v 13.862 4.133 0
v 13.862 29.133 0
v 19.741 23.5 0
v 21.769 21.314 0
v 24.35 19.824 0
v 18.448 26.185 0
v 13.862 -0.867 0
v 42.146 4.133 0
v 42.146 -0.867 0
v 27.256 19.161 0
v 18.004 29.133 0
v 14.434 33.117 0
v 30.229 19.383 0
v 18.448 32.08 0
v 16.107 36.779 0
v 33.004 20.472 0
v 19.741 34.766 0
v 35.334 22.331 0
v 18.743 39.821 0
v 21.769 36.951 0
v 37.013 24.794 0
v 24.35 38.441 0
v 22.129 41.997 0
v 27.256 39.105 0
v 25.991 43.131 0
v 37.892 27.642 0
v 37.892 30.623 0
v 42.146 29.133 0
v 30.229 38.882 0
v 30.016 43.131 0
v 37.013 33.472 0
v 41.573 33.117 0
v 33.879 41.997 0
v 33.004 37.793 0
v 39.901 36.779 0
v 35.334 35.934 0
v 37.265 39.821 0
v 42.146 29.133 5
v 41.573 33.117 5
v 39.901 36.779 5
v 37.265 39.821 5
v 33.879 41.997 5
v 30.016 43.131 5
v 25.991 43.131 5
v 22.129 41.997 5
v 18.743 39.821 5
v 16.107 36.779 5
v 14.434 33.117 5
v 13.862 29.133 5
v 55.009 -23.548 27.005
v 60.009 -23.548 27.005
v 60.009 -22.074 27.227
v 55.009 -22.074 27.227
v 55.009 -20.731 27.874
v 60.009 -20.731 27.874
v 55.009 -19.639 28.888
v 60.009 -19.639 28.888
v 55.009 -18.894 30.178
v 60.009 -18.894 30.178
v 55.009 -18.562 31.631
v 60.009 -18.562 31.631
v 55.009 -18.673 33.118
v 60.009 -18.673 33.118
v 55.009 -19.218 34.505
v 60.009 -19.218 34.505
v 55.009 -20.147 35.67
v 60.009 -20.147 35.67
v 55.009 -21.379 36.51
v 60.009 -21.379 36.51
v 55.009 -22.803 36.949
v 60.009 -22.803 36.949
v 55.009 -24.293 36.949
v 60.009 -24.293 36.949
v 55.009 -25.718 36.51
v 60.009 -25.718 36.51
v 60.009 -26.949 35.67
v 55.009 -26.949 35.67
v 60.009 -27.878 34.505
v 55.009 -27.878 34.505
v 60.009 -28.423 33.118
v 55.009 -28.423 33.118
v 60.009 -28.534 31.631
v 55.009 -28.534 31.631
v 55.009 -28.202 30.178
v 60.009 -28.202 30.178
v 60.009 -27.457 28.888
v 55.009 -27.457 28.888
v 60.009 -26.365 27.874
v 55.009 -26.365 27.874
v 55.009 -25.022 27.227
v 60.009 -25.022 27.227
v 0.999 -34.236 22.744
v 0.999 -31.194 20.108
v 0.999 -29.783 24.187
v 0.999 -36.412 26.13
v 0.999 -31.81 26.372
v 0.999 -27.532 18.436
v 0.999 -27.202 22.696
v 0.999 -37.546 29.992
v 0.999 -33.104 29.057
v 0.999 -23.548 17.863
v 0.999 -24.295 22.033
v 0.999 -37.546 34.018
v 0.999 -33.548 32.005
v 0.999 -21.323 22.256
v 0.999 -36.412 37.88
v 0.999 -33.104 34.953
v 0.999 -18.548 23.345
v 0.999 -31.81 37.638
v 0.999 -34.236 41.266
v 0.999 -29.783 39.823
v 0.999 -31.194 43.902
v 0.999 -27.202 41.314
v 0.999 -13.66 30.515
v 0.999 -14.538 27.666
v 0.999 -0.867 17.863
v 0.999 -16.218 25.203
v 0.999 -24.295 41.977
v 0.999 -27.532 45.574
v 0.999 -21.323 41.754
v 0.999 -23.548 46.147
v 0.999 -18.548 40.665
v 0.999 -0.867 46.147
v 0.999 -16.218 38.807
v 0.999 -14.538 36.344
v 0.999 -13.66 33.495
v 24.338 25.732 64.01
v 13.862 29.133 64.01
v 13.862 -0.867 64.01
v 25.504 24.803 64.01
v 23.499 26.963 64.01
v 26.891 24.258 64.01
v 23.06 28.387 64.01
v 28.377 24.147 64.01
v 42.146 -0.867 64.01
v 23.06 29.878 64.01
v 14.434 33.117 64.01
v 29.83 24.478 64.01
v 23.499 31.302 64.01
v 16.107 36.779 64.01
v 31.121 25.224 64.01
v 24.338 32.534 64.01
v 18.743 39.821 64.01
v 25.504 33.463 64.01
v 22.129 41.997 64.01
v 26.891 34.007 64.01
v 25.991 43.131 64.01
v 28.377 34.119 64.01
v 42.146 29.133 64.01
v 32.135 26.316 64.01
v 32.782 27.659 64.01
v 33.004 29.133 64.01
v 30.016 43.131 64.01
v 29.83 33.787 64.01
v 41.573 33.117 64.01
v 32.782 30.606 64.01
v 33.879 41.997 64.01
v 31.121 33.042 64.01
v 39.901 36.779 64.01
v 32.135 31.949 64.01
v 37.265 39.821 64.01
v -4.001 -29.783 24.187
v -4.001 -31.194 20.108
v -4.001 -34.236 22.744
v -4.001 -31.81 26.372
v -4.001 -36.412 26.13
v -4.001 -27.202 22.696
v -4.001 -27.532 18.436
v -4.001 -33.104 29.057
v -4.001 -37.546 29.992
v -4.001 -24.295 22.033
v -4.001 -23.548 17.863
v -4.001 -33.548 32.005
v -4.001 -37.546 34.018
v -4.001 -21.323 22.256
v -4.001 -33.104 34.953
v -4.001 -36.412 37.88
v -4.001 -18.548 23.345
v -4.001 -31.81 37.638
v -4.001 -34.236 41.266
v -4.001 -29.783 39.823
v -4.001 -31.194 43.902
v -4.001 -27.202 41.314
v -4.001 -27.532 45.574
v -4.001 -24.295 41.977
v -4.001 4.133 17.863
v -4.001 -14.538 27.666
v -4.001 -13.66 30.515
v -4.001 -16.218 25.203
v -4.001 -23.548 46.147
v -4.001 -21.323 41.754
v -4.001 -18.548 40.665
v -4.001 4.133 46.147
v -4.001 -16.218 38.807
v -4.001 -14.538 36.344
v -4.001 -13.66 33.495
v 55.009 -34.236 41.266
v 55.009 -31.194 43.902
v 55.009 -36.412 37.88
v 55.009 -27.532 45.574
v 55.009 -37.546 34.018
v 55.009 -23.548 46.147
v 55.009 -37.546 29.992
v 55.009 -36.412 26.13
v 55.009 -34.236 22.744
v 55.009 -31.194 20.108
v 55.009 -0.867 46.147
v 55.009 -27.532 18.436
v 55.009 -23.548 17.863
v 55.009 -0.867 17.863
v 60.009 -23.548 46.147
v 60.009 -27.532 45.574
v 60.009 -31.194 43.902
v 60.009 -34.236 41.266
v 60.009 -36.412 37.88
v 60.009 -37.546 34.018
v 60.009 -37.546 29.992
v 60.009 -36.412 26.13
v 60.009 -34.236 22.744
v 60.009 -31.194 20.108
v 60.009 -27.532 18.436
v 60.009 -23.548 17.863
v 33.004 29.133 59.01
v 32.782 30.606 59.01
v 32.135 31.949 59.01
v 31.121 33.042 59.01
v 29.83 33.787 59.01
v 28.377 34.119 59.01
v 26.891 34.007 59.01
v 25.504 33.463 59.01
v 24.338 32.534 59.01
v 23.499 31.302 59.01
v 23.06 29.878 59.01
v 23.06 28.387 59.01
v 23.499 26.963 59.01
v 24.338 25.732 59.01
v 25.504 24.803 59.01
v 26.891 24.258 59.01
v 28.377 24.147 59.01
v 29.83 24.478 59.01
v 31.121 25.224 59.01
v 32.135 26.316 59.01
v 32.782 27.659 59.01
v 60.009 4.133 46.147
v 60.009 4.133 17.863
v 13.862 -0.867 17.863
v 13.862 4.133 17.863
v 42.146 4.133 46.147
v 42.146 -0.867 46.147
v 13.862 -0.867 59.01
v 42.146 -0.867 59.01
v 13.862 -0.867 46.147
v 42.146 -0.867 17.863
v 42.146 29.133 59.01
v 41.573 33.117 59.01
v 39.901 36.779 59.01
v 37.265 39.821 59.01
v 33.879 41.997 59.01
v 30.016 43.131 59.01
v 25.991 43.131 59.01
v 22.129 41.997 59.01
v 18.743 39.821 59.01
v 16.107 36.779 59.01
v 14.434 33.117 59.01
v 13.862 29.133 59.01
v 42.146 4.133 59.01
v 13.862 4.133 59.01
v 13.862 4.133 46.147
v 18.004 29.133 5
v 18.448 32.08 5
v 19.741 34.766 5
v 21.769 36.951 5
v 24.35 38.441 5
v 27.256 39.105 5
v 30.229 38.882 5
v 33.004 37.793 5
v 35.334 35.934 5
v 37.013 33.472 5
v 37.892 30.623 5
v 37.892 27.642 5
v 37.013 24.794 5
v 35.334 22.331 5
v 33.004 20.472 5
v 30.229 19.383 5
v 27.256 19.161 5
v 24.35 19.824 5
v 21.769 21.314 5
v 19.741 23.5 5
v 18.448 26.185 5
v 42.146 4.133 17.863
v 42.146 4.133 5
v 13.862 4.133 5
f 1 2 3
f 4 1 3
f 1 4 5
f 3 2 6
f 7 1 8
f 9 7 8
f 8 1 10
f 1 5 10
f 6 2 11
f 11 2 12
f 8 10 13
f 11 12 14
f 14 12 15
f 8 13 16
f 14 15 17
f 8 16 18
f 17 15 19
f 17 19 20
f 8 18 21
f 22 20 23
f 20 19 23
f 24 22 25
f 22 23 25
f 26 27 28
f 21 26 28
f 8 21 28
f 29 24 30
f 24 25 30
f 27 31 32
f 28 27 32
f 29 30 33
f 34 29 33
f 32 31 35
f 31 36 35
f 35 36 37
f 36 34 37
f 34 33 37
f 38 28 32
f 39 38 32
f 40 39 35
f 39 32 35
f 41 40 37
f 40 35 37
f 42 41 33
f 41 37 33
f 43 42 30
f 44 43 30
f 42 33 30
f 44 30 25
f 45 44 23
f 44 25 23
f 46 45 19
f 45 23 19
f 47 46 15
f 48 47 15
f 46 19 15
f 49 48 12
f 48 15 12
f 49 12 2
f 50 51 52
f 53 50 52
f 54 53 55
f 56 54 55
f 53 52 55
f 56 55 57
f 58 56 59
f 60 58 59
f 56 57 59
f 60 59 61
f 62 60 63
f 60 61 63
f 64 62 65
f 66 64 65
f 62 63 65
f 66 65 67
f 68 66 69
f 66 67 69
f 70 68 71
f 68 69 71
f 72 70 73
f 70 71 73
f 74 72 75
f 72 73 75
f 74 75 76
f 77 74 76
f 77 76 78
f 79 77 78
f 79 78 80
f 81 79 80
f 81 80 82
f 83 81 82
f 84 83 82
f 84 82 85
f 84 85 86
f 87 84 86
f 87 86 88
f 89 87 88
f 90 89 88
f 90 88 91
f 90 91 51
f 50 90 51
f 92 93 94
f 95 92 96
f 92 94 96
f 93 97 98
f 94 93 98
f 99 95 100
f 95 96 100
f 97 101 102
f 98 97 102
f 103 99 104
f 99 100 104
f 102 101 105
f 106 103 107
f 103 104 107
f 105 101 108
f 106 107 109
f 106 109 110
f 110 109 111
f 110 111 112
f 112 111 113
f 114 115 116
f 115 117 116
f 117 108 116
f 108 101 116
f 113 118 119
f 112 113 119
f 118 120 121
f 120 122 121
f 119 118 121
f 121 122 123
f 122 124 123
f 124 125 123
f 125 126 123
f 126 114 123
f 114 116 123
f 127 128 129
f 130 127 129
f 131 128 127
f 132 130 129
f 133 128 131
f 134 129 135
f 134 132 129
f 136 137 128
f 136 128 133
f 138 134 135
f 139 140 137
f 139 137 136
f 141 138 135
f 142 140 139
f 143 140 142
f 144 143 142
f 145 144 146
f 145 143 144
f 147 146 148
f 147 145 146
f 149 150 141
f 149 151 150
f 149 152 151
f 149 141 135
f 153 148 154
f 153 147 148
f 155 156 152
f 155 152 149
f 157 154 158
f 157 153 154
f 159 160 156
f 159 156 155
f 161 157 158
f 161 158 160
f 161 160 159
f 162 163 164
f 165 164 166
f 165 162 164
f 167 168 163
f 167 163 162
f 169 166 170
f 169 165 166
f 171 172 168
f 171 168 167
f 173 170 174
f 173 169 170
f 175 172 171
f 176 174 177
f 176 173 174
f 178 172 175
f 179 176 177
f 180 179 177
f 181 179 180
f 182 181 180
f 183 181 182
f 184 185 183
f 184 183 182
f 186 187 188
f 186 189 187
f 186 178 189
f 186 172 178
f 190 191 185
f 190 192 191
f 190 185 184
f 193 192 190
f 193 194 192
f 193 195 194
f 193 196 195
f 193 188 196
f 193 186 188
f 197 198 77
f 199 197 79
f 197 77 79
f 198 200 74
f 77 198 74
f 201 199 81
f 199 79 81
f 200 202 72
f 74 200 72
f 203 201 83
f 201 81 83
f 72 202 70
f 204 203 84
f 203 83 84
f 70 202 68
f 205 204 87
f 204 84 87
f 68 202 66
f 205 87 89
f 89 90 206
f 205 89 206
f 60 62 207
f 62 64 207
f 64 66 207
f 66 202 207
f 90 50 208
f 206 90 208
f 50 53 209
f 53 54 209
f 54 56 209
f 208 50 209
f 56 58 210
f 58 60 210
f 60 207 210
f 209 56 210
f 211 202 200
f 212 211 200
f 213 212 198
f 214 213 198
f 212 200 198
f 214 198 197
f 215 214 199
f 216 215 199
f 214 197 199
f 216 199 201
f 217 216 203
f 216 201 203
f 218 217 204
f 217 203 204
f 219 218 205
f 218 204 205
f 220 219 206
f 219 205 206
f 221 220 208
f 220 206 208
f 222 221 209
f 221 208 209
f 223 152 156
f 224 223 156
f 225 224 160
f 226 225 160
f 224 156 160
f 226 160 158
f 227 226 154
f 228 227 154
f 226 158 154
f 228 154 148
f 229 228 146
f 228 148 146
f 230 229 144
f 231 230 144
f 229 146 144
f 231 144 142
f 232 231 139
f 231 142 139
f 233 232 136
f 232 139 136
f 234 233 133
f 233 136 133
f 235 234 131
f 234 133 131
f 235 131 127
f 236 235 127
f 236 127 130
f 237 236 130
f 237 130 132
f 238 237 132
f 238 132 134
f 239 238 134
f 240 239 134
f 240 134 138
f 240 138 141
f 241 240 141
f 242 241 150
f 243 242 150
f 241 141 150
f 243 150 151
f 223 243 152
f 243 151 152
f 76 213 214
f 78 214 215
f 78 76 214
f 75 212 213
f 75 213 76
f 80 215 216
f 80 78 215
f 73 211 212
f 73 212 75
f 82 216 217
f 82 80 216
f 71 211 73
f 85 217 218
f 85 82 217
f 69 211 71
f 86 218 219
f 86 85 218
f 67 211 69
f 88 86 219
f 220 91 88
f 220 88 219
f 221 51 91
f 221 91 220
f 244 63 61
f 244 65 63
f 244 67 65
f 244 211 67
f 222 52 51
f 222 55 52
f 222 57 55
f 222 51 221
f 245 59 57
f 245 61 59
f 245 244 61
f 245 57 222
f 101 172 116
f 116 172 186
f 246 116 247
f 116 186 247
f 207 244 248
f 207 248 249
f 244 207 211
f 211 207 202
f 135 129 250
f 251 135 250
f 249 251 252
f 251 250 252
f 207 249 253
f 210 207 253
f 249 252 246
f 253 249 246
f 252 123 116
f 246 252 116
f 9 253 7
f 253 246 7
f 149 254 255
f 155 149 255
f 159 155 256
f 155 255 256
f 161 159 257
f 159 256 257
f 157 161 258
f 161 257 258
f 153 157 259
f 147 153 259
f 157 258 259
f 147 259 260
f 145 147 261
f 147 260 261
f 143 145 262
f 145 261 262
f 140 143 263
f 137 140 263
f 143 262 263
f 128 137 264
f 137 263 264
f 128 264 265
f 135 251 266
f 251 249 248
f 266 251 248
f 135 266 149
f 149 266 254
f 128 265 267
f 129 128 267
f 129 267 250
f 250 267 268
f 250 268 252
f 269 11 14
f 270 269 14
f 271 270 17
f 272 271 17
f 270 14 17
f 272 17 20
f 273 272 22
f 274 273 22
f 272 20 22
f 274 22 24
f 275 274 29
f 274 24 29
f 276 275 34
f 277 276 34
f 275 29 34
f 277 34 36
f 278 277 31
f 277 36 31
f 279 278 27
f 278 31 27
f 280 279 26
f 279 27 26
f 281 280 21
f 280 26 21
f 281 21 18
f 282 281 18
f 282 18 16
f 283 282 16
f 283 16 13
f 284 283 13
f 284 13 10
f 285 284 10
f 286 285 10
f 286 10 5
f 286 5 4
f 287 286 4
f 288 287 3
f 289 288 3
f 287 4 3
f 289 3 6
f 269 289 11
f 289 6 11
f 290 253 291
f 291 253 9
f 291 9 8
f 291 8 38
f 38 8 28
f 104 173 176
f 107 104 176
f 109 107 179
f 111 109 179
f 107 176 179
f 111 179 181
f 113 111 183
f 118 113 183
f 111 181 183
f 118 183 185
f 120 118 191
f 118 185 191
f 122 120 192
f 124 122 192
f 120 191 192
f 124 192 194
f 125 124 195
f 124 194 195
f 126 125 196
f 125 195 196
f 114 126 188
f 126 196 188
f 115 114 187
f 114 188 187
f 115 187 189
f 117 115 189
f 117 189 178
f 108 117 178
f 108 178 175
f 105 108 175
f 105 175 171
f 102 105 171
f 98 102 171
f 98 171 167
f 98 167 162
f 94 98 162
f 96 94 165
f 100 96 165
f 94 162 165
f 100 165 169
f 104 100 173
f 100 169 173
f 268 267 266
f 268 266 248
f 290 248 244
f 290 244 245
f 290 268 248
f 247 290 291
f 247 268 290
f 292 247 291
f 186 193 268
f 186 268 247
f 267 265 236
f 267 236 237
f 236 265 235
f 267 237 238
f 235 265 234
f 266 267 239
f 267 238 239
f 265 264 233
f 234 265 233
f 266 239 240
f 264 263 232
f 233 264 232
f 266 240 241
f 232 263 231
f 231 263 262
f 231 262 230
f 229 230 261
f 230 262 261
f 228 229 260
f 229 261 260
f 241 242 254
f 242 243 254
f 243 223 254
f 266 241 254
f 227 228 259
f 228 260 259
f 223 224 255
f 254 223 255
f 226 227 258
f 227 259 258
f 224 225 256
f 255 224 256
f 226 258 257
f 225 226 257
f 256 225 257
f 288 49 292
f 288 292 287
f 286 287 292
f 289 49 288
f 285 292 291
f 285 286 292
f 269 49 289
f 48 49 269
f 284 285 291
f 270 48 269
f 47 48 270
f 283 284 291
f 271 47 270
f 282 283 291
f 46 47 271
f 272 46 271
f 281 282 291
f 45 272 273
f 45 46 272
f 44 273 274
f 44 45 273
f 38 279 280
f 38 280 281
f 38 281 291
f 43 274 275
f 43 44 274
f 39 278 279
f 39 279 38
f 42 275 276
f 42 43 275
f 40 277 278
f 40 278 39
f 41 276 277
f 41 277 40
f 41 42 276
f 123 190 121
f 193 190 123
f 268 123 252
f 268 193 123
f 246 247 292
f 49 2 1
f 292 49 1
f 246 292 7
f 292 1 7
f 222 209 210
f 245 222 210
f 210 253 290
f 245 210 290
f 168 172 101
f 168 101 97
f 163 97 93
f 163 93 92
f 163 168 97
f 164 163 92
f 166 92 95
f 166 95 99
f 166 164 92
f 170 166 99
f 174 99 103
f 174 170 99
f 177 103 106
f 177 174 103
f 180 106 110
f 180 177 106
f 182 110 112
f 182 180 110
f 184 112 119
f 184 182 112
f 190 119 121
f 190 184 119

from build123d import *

# Parameters (mm, degrees)
BOSS_EXTRUDE1_DEPTH  = 5
SKETCH2_R            = 2.05
CUT_EXTRUDE1_DEPTH   = 5
SKETCH3_W            = 28.284271247
SKETCH3_H            = 5
BOSS_EXTRUDE3_DEPTH  = 5
SKETCH4_W            = 28.284271247
SKETCH4_H            = 5
BOSS_EXTRUDE4_DEPTH  = 54.01
BOSS_EXTRUDE5_DEPTH  = 5
SKETCH6_W            = 14.142135624
SKETCH6_H            = 14.14215
SKETCH6_W_2          = 12.862864377
SKETCH6_W_3          = 14.142135623
SKETCH6_W_4          = 12.862864376
BOSS_EXTRUDE7_DEPTH  = 5
SKETCH8_W            = 28.2843
SKETCH8_H            = 5
BOSS_EXTRUDE8_DEPTH  = 5
SKETCH10_W           = 5
SKETCH10_H           = 28.2843
BOSS_EXTRUDE9_DEPTH  = 22.6808
BOSS_EXTRUDE10_DEPTH = 5
SKETCH12_W           = 28.2843
SKETCH12_H           = 5
BOSS_EXTRUDE11_DEPTH = 5
BOSS_EXTRUDE12_START = -5
BOSS_EXTRUDE12_DEPTH = 5
SKETCH15_R           = 5
CUT_EXTRUDE3_DEPTH   = 5
SKETCH16_R           = 5
CUT_EXTRUDE4_DEPTH   = 14.1
SKETCH17_R           = 2.05
CUT_EXTRUDE5_DEPTH   = 8.1
SKETCH18_R           = 10
CUT_EXTRUDE6_DEPTH   = 5
SKETCH19_R           = 10
CUT_EXTRUDE7_DEPTH   = 5


with BuildPart() as part:
    # Model → Boss-Extrude1 (new body)
    with BuildSketch(Plane.XY):
        with BuildLine():
            Line((13.86155204, 4.132702322), (42.145823287, 4.132702322))
            Line((42.145823287, 4.132702322), (42.145823287, 29.132702322))
            ThreePointArc((42.145823287, 29.132702322), (28.003687664, 43.274837946), (13.86155204, 29.132702322))
            Line((13.86155204, 29.132702322), (13.86155204, 4.132702322))
        make_face()
    extrude(amount=BOSS_EXTRUDE1_DEPTH)

    # Sketch2 → Cut-Extrude1 (cut)
    with BuildSketch(Plane.XY.offset(5)):
        with Locations((28.003687664, 29.132702322)):
            Circle(SKETCH2_R)
    extrude(amount=-CUT_EXTRUDE1_DEPTH, mode=Mode.SUBTRACT)

    # Sketch3 → Boss-Extrude3 (add)
    with BuildSketch(Plane.XZ.offset(-4.132702322)):
        with Locations((28.003687664, 2.5)):
            Rectangle(SKETCH3_W, SKETCH3_H)
    extrude(amount=BOSS_EXTRUDE3_DEPTH)

    # Sketch4 → Boss-Extrude4 (add)
    with BuildSketch(Plane.XY.offset(5)):
        with Locations((28.003687664, 1.632702322)):
            Rectangle(SKETCH4_W, SKETCH4_H)
    extrude(amount=BOSS_EXTRUDE4_DEPTH)

    # Sketch5 → Boss-Extrude5 (add)
    with BuildSketch(Plane.XY.offset(59.01)):
        with BuildLine():
            Line((42.145823287, 4.132702322), (42.145823287, 29.132702322))
            ThreePointArc((42.145823287, 29.132702322), (28.003687664, 43.274837946), (13.86155204, 29.132702322))
            Line((13.86155204, 29.132702322), (13.86155204, 4.132702322))
            Line((13.86155204, 4.132702322), (13.86155204, -0.867297678))
            Line((13.86155204, -0.867297678), (42.145823287, -0.867297678))
            Line((42.145823287, -0.867297678), (42.145823287, 4.132702322))
        make_face()
    extrude(amount=BOSS_EXTRUDE5_DEPTH)

    # Sketch6 → Boss-Extrude7 (add)
    with BuildSketch(Plane.XZ.offset(0.867297678)):
        with Locations((20.932619852, 39.076075)):
            Rectangle(SKETCH6_W, SKETCH6_H)
        with Locations((48.577255476, 39.076075)):
            Rectangle(SKETCH6_W_2, SKETCH6_H)
        with Locations((35.074755476, 39.076075)):
            Rectangle(SKETCH6_W_3, SKETCH6_H)
        with Locations((7.430119852, 39.076075)):
            Rectangle(SKETCH6_W_4, SKETCH6_H)
        with Locations((7.430119852, 24.933925)):
            Rectangle(SKETCH6_W_4, SKETCH6_H)
        Polygon((28.003687664, 32.005), (13.86155204, 32.005), (13.86155204, 17.86285), (42.145823287, 17.86285), (42.145823287, 32.005), align=None)
        with Locations((48.577255476, 24.933925)):
            Rectangle(SKETCH6_W_2, SKETCH6_H)
    extrude(amount=-BOSS_EXTRUDE7_DEPTH)

    # Sketch8 → Boss-Extrude8 (add)
    with BuildSketch(Plane.ZY.offset(-0.998687664)):
        with Locations((32.005, 1.632702322)):
            Rectangle(SKETCH8_W, SKETCH8_H)
    extrude(amount=BOSS_EXTRUDE8_DEPTH)

    # Sketch10 → Boss-Extrude9 (add)
    with BuildSketch(Plane.XZ.offset(0.867297678)):
        with Locations((-1.501312336, 32.005)):
            Rectangle(SKETCH10_W, SKETCH10_H)
    extrude(amount=BOSS_EXTRUDE9_DEPTH)

    # Sketch11 → Boss-Extrude10 (add)
    with BuildSketch(Plane.ZY.offset(4.001312336)):
        with BuildLine():
            Line((46.14715, -23.548097678), (17.86285, -23.548097678))
            ThreePointArc((17.86285, -23.548097678), (32.005, -37.690247678), (46.14715, -23.548097678))
        make_face()
    extrude(amount=-BOSS_EXTRUDE10_DEPTH)

    # Sketch12 → Boss-Extrude11 (add)
    with BuildSketch(Plane(origin=(55.008687664, 0, 0), x_dir=(0, 0, -1), z_dir=(1, 0, 0))):
        with Locations((-32.005, 1.632702322)):
            Rectangle(SKETCH12_W, SKETCH12_H)
    extrude(amount=BOSS_EXTRUDE11_DEPTH)

    # Sketch14 → Boss-Extrude12 (add)
    with BuildSketch(Plane(origin=(60.008687664, 0, 0), x_dir=(0, 0, -1), z_dir=(1, 0, 0)).offset(BOSS_EXTRUDE12_START)):
        with BuildLine():
            Line((-17.86285, -0.867297678), (-46.14715, -0.867297678))
            Line((-46.14715, -0.867297678), (-46.14715, -23.548097678))
            ThreePointArc((-46.14715, -23.548097678), (-32.005, -37.690247678), (-17.86285, -23.548097678))
            Line((-17.86285, -23.548097678), (-17.86285, -0.867297678))
        make_face()
    extrude(amount=BOSS_EXTRUDE12_DEPTH)

    # Sketch15 → Cut-Extrude3 (cut)
    with BuildSketch(Plane.XY.offset(64.01)):
        with Locations((28.003687664, 29.132702322)):
            Circle(SKETCH15_R)
    extrude(amount=-CUT_EXTRUDE3_DEPTH, mode=Mode.SUBTRACT)

    # Sketch16 → Cut-Extrude4 (cut)
    with BuildSketch(Plane(origin=(60.008687664, 0, 0), x_dir=(0, 0, -1), z_dir=(1, 0, 0))):
        with Locations((-32.005, -23.548097678)):
            Circle(SKETCH16_R)
    extrude(amount=-CUT_EXTRUDE4_DEPTH, mode=Mode.SUBTRACT)

    # Sketch17 → Cut-Extrude5 (cut)
    with BuildSketch(Plane.ZY.offset(4.001312336)):
        with Locations(Location((32.005, -23.548097678, 0), (0, 0, 270))):
            Circle(SKETCH17_R)
    extrude(amount=-CUT_EXTRUDE5_DEPTH, mode=Mode.SUBTRACT)

    # Sketch18 → Cut-Extrude6 (cut)
    with BuildSketch(Plane(origin=(0, 0, 0), x_dir=(-1, 0, 0), z_dir=(0, 0, -1))):
        with Locations((-28.003687664, 29.132702322)):
            Circle(SKETCH18_R)
    extrude(amount=-CUT_EXTRUDE6_DEPTH, mode=Mode.SUBTRACT)

    # Sketch19 → Cut-Extrude7 (cut)
    with BuildSketch(Plane.ZY.offset(4.001312336)):
        with Locations(Location((32.005, -23.548097678, 0), (0, 0, 270))):
            Circle(SKETCH19_R)
    extrude(amount=-CUT_EXTRUDE7_DEPTH, mode=Mode.SUBTRACT)


solid = part.part
